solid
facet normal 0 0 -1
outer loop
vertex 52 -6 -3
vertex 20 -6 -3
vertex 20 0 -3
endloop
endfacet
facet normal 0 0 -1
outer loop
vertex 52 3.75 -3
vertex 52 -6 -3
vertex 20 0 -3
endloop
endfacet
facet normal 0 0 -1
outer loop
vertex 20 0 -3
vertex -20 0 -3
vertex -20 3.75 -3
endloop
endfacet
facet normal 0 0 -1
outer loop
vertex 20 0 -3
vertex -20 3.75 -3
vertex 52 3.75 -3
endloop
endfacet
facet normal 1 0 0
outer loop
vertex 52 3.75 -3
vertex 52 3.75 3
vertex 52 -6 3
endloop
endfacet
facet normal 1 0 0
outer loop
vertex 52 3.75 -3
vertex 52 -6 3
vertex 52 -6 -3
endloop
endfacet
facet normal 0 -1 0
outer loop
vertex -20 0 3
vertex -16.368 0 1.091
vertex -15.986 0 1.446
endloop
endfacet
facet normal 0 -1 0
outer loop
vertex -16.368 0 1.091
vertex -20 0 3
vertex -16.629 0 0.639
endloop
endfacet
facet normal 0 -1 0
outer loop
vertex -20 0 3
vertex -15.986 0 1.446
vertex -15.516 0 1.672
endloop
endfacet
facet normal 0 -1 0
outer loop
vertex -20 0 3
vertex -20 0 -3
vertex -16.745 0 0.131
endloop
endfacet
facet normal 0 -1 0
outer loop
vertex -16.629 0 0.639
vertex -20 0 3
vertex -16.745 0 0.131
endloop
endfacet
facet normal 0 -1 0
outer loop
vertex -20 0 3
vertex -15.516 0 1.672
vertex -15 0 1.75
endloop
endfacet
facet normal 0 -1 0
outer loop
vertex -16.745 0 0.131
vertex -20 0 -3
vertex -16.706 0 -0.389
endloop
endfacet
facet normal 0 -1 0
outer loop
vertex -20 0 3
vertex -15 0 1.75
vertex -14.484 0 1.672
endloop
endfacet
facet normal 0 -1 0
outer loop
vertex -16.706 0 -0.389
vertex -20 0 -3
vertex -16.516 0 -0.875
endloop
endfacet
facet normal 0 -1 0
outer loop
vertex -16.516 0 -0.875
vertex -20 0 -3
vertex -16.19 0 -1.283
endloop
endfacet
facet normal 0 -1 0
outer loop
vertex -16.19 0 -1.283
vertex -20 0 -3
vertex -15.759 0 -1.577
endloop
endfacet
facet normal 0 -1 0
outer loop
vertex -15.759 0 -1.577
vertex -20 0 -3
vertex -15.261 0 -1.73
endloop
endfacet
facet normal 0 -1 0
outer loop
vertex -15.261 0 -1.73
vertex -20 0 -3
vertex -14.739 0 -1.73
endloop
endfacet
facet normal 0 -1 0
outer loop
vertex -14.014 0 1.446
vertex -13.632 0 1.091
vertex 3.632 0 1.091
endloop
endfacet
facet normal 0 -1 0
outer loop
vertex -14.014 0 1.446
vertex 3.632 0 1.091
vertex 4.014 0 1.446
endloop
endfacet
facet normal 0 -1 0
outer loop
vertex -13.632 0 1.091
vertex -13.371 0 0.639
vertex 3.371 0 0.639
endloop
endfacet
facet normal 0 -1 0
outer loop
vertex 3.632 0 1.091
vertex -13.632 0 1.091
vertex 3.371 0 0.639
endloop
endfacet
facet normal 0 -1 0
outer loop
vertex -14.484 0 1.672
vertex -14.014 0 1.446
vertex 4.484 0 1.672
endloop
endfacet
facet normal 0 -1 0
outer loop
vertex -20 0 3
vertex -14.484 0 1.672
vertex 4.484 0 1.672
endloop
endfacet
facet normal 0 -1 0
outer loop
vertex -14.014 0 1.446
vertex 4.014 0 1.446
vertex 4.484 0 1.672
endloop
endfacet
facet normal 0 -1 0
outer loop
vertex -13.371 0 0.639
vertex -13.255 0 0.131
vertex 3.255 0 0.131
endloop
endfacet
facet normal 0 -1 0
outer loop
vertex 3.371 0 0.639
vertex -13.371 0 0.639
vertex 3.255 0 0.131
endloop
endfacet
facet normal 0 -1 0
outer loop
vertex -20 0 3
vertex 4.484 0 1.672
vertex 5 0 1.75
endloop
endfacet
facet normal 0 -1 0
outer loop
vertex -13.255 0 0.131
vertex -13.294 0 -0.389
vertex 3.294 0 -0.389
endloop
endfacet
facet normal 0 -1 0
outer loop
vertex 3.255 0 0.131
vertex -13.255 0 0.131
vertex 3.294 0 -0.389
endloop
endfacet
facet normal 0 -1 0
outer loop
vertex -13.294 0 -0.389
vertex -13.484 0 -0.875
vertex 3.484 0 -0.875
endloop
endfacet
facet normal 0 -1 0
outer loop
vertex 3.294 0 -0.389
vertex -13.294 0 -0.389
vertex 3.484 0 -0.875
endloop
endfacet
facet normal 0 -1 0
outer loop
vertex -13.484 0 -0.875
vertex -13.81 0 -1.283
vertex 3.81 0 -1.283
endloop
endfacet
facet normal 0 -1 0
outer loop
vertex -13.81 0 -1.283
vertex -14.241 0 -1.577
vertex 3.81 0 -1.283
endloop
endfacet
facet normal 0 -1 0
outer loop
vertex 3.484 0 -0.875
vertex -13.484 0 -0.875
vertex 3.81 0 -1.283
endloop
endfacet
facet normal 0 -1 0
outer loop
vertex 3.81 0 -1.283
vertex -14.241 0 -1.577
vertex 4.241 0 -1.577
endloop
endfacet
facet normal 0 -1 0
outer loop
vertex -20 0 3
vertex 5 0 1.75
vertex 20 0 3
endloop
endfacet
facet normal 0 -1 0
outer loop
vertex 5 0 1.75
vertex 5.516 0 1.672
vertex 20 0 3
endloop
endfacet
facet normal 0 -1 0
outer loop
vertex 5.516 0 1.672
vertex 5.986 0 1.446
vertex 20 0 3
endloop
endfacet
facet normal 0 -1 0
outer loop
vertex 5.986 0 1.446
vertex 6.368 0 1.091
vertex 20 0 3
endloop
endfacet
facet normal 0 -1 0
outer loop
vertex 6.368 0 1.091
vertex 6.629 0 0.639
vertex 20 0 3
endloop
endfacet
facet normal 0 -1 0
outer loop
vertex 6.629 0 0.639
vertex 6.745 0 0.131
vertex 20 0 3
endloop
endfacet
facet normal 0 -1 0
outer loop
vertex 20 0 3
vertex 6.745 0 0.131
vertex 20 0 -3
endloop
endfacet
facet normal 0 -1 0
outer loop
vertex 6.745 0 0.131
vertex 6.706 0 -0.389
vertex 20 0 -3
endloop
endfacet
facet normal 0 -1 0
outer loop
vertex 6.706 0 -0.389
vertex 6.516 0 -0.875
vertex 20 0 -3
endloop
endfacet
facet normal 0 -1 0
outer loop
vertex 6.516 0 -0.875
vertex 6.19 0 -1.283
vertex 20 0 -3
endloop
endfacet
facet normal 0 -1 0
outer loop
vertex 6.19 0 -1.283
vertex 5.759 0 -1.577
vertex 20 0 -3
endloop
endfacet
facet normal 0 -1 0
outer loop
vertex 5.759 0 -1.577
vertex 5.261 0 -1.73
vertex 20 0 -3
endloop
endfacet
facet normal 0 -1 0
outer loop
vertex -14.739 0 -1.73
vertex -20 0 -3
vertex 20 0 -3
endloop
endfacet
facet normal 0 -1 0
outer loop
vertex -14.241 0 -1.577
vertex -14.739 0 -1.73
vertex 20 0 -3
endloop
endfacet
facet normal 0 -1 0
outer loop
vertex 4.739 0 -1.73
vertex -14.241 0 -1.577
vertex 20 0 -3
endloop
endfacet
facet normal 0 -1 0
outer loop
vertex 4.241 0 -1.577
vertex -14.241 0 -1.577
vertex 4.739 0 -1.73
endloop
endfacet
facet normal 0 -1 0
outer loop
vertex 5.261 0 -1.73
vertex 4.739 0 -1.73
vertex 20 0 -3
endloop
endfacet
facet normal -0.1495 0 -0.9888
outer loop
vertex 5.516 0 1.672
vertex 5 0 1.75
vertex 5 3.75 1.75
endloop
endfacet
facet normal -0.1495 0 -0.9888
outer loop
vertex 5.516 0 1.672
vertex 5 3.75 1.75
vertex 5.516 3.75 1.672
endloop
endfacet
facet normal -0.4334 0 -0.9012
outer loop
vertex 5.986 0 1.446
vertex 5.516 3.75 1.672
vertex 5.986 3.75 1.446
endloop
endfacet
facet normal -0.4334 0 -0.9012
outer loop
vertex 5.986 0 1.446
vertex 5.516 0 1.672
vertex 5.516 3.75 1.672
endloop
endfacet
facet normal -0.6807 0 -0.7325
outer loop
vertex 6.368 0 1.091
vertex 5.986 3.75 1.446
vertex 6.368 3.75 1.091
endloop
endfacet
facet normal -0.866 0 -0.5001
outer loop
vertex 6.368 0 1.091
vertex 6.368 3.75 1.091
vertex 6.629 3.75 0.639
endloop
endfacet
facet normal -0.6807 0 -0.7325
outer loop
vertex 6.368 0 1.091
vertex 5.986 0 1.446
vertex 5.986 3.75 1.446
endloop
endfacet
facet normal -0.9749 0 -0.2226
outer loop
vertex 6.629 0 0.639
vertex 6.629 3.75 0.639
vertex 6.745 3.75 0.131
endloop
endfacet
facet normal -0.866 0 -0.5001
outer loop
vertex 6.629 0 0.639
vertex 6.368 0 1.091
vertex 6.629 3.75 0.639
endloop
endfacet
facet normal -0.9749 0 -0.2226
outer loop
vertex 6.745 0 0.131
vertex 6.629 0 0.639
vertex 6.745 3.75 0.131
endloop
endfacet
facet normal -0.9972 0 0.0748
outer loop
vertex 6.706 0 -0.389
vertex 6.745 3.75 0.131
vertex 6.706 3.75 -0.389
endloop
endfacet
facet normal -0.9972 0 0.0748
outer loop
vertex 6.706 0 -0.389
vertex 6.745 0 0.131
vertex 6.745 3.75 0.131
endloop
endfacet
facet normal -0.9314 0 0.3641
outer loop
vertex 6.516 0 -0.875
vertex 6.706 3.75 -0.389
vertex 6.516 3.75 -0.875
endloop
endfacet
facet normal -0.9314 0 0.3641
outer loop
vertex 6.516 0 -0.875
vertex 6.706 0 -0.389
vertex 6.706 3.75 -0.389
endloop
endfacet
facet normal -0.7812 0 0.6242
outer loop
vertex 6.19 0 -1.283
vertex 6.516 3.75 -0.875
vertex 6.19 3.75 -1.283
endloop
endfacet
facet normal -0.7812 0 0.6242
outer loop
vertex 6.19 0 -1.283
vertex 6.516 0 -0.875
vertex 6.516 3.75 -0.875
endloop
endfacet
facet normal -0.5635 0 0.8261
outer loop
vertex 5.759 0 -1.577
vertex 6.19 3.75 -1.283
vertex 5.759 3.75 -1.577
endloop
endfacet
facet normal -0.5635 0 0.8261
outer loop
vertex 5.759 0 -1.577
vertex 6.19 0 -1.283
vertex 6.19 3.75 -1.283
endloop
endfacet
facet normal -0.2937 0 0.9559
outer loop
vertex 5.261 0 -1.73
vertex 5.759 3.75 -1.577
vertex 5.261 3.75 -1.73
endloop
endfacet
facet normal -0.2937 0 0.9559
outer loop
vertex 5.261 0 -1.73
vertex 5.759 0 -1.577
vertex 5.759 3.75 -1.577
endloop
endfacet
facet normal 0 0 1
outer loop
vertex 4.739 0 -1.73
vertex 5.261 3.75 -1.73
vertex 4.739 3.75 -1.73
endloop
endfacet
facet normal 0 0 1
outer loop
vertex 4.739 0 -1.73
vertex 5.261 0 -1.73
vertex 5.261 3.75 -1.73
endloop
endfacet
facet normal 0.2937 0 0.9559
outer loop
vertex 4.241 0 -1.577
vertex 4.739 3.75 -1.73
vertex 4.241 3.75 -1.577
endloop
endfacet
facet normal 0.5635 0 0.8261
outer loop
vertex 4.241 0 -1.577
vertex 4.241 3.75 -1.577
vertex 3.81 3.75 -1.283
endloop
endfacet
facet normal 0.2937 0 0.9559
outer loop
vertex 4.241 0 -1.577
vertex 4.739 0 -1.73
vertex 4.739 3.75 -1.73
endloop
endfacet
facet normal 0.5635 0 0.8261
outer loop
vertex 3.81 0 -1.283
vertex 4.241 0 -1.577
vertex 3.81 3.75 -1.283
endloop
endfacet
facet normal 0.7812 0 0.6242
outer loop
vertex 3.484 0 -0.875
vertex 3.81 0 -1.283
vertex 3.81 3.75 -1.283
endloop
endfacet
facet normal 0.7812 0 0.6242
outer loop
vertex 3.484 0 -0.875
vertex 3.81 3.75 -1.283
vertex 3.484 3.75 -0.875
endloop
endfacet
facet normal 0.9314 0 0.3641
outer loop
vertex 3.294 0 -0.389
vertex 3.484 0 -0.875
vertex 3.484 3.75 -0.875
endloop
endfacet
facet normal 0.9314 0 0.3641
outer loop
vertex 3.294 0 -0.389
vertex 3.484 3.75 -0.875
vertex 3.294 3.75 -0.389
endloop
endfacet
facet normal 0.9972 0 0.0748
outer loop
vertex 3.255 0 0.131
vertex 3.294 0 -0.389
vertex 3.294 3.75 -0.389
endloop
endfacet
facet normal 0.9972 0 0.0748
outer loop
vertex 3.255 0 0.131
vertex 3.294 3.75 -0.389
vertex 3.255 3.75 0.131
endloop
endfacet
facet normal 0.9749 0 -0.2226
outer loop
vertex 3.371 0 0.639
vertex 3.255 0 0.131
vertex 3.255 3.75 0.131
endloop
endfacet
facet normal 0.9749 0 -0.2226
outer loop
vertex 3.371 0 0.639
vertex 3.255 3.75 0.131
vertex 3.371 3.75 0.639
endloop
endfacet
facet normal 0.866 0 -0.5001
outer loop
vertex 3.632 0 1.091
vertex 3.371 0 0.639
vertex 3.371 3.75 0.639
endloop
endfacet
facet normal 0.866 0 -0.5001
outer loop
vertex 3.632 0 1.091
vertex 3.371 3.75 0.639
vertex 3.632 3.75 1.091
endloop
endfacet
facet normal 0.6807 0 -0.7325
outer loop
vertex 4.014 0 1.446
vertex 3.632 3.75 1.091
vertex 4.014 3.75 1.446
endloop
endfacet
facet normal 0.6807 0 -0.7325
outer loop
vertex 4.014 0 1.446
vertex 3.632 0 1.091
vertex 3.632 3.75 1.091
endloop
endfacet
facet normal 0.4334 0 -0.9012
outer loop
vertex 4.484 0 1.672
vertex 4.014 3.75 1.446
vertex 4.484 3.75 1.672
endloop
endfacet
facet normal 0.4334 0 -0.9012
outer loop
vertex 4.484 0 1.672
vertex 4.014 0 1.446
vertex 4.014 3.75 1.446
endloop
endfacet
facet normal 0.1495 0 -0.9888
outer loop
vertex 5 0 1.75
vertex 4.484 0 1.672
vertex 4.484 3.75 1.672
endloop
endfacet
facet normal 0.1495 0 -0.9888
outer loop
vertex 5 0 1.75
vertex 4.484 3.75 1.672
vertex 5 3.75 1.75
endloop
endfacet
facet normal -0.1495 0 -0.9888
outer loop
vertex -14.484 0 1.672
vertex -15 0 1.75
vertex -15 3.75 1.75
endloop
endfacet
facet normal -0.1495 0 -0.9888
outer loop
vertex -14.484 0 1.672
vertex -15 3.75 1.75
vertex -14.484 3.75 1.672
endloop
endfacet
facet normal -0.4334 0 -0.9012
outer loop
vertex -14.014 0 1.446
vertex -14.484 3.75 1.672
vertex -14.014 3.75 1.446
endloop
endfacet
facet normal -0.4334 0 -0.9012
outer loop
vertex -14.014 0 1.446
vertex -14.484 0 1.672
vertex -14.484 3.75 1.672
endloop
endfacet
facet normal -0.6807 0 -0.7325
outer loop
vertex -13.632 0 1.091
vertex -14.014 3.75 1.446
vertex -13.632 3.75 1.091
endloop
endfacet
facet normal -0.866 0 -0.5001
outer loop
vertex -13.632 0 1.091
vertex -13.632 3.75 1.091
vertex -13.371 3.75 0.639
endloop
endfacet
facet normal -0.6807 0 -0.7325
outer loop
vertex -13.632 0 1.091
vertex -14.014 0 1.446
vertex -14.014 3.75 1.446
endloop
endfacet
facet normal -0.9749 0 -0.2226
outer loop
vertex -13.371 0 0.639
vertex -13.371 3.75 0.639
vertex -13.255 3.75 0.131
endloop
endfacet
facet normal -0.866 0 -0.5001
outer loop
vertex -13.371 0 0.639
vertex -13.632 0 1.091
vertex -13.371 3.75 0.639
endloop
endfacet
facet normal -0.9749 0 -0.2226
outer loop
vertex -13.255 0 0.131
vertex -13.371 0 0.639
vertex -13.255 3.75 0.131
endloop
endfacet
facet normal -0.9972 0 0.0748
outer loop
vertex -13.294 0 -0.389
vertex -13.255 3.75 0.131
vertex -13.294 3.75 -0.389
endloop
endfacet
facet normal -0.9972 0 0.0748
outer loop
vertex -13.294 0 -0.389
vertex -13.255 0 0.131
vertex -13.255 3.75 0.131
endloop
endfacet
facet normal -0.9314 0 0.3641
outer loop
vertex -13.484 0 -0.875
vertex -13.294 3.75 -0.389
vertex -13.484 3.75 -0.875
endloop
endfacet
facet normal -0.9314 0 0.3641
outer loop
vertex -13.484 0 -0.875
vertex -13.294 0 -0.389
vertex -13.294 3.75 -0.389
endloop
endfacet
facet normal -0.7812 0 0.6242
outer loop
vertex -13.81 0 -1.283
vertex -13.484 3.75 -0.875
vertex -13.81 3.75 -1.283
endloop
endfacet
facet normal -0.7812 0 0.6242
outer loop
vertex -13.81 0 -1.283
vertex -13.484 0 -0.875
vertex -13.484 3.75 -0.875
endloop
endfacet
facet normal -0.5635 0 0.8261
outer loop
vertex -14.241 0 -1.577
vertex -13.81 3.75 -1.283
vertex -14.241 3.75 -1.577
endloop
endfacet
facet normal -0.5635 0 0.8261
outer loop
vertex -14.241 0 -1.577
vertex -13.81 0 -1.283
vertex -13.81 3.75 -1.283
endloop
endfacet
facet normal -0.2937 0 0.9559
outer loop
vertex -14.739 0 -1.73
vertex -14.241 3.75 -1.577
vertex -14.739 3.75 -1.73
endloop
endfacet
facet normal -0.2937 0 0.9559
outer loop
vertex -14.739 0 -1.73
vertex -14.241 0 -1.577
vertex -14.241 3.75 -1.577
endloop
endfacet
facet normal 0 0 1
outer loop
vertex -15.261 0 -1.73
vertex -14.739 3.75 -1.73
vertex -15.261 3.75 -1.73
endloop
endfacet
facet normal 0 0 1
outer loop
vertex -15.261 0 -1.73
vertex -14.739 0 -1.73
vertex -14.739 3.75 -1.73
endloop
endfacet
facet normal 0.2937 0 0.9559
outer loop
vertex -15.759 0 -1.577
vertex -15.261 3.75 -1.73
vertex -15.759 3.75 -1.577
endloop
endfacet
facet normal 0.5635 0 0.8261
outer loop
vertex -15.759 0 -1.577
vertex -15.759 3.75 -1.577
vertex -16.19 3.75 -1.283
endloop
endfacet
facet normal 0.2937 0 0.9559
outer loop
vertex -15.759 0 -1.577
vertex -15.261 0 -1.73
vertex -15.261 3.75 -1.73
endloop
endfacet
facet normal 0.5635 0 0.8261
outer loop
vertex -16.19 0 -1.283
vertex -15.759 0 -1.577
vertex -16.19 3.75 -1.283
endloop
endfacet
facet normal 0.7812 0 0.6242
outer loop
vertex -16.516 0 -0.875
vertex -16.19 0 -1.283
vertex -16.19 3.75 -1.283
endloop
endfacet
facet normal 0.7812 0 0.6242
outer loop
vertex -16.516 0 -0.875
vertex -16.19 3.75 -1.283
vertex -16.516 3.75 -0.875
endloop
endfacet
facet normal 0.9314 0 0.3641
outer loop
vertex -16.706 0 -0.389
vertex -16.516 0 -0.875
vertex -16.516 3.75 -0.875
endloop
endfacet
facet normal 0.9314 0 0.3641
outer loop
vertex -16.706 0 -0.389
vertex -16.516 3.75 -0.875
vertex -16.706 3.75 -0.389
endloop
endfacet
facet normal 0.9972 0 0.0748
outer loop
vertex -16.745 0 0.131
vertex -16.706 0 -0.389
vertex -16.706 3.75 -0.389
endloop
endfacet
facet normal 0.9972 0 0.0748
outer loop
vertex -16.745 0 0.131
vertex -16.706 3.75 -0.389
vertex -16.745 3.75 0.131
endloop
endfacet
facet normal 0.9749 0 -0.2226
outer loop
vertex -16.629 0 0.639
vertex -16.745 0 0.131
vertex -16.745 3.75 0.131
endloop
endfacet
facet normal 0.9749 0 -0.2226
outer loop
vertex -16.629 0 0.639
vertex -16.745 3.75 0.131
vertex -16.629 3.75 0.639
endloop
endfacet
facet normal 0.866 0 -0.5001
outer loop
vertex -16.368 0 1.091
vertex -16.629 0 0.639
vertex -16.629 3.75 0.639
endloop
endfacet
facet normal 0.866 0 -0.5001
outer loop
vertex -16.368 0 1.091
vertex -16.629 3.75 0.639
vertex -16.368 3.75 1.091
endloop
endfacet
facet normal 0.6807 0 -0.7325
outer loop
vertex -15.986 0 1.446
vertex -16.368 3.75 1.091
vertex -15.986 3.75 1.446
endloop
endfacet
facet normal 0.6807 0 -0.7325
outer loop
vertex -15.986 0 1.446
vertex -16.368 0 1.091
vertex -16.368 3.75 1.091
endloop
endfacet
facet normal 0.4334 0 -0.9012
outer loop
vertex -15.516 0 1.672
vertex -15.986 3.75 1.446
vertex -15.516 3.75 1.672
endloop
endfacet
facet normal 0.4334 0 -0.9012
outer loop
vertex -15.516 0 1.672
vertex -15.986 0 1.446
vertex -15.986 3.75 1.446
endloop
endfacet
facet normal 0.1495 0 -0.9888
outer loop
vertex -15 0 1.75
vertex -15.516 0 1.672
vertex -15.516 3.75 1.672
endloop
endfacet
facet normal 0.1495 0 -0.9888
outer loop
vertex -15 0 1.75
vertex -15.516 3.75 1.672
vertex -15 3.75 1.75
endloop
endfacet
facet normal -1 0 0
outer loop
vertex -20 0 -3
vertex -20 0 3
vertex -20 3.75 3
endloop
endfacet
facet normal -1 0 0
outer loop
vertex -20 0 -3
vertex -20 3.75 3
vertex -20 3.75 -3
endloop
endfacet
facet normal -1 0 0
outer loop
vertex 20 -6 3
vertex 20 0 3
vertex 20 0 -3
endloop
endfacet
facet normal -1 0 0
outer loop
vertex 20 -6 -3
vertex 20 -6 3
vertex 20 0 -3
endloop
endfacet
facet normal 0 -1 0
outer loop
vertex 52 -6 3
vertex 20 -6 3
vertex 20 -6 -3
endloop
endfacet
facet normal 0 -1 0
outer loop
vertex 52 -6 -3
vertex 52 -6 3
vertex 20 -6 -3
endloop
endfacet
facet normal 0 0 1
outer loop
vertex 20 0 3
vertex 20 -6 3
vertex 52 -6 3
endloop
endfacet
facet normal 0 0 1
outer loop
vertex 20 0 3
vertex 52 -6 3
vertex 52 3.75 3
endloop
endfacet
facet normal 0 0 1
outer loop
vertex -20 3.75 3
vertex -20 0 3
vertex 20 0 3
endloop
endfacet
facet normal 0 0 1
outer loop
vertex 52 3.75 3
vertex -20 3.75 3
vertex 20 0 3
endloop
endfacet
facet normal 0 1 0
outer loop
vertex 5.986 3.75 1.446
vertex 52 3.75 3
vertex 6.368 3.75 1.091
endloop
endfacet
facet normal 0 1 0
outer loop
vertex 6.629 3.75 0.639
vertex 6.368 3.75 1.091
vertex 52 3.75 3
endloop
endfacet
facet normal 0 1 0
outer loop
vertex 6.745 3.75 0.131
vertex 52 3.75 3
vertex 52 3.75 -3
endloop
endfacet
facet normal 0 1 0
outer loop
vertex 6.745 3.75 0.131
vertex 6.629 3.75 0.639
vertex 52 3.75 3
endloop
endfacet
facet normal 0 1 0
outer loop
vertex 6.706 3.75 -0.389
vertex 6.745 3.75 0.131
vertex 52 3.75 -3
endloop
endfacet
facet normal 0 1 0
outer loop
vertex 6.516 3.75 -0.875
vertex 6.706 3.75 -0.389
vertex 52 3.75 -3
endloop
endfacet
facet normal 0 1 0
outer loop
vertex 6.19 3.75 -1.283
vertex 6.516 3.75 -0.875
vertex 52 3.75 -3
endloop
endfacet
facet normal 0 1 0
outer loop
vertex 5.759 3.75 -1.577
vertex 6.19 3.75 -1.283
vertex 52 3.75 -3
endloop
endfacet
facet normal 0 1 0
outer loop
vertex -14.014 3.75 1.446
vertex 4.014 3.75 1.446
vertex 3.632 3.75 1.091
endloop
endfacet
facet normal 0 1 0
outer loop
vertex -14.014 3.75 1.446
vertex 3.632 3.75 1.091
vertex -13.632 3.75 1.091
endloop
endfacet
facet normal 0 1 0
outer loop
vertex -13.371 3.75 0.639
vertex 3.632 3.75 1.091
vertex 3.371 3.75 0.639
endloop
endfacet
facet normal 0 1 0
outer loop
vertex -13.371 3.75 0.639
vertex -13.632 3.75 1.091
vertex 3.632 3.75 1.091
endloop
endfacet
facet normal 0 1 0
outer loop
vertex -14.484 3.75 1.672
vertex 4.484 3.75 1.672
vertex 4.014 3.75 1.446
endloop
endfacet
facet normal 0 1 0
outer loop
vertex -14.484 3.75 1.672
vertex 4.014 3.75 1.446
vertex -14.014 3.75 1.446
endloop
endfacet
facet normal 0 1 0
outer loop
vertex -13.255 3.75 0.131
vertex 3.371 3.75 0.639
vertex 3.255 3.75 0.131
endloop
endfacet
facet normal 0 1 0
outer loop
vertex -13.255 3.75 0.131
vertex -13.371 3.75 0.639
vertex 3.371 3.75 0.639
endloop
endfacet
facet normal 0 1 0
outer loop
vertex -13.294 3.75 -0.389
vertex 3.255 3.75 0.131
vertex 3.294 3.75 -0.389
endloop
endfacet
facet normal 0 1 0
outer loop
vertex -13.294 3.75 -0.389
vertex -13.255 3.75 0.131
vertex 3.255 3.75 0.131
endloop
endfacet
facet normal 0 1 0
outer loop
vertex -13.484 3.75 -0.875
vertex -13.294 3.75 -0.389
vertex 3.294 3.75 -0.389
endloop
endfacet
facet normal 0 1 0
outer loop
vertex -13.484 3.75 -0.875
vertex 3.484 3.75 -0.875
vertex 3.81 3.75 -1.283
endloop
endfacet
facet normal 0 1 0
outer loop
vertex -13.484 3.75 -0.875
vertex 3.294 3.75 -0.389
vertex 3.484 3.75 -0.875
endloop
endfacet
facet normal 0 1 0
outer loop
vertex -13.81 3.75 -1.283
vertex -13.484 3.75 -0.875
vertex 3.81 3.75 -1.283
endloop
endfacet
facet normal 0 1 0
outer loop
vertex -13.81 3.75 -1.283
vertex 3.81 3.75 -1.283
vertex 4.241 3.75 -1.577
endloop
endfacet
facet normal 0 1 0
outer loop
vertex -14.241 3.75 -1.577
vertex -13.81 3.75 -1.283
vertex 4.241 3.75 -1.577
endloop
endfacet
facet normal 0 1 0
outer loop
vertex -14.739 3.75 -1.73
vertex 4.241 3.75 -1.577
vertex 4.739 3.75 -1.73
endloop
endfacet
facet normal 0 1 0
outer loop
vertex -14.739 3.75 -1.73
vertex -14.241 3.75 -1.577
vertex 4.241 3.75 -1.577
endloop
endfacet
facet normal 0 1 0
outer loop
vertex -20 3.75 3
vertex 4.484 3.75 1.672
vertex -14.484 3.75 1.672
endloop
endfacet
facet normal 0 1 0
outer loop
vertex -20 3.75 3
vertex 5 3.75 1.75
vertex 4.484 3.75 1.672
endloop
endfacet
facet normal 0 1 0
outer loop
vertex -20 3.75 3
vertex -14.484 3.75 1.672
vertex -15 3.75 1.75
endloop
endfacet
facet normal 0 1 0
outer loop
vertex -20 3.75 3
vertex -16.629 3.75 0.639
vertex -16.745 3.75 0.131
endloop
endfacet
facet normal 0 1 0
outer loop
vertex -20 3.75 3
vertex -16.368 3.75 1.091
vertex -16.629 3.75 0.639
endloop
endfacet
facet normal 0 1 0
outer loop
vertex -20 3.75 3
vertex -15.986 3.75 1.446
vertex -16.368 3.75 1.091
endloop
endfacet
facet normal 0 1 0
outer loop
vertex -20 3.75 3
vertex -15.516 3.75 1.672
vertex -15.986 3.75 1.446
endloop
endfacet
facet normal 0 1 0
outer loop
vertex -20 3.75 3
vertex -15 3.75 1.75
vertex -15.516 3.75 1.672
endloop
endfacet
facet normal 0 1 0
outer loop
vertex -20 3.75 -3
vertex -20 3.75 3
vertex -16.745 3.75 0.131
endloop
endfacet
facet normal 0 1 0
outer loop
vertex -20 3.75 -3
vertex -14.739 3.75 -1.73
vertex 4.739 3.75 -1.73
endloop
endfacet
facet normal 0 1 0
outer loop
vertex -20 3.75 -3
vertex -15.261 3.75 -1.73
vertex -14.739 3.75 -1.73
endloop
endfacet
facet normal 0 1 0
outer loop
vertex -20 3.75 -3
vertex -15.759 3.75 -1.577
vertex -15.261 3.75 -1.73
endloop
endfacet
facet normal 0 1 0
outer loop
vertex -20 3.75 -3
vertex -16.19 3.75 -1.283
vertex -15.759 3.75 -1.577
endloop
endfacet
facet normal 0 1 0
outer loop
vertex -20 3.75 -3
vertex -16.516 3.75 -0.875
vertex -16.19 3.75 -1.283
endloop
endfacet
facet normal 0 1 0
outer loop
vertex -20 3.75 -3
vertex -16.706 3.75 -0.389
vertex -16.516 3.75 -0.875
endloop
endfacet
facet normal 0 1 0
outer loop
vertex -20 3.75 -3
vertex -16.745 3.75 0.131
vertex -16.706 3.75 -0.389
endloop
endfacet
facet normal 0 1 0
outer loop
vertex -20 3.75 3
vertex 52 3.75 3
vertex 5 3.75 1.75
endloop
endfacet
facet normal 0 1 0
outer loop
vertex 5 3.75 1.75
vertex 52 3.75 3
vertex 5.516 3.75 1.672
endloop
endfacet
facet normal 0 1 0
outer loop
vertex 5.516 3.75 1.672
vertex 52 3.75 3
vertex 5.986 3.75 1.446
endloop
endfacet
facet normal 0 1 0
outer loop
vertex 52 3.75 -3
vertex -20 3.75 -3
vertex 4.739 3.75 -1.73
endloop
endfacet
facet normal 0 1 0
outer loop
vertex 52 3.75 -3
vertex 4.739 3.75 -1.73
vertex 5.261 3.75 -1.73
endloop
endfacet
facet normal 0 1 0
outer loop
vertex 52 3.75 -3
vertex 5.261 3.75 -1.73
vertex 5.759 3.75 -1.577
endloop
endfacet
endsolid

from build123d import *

# Parameters (mm, degrees)
SKETCH_1_W      = 40
SKETCH_1_H      = 6
SKETCH_1_R      = 1.75
EXTRUDE_1_DEPTH = 3.75
SKETCH_2_W      = 6
SKETCH_2_H      = 9.75
EXTRUDE_2_DEPTH = 32


with BuildPart() as part:
    # 草图1 → 凸台-拉伸1 (new body)
    with BuildSketch(Plane(origin=(0, 0, 0), x_dir=(1, 0, 0), z_dir=(0, 1, 0))):
        Rectangle(SKETCH_1_W, SKETCH_1_H)
        with Locations(Location((-15, 0, 0), (0, 0, 270))):
            Circle(SKETCH_1_R, mode=Mode.SUBTRACT)
        with Locations(Location((5, 0, 0), (0, 0, 270))):
            Circle(SKETCH_1_R, mode=Mode.SUBTRACT)
    extrude(amount=EXTRUDE_1_DEPTH)

    # 草图2 → 凸台-拉伸2 (add)
    with BuildSketch(Plane(origin=(20, 0, 0), x_dir=(0, 0, -1), z_dir=(1, 0, 0))):
        with Locations((0, -1.125)):
            Rectangle(SKETCH_2_W, SKETCH_2_H)
    extrude(amount=EXTRUDE_2_DEPTH)


solid = part.part
